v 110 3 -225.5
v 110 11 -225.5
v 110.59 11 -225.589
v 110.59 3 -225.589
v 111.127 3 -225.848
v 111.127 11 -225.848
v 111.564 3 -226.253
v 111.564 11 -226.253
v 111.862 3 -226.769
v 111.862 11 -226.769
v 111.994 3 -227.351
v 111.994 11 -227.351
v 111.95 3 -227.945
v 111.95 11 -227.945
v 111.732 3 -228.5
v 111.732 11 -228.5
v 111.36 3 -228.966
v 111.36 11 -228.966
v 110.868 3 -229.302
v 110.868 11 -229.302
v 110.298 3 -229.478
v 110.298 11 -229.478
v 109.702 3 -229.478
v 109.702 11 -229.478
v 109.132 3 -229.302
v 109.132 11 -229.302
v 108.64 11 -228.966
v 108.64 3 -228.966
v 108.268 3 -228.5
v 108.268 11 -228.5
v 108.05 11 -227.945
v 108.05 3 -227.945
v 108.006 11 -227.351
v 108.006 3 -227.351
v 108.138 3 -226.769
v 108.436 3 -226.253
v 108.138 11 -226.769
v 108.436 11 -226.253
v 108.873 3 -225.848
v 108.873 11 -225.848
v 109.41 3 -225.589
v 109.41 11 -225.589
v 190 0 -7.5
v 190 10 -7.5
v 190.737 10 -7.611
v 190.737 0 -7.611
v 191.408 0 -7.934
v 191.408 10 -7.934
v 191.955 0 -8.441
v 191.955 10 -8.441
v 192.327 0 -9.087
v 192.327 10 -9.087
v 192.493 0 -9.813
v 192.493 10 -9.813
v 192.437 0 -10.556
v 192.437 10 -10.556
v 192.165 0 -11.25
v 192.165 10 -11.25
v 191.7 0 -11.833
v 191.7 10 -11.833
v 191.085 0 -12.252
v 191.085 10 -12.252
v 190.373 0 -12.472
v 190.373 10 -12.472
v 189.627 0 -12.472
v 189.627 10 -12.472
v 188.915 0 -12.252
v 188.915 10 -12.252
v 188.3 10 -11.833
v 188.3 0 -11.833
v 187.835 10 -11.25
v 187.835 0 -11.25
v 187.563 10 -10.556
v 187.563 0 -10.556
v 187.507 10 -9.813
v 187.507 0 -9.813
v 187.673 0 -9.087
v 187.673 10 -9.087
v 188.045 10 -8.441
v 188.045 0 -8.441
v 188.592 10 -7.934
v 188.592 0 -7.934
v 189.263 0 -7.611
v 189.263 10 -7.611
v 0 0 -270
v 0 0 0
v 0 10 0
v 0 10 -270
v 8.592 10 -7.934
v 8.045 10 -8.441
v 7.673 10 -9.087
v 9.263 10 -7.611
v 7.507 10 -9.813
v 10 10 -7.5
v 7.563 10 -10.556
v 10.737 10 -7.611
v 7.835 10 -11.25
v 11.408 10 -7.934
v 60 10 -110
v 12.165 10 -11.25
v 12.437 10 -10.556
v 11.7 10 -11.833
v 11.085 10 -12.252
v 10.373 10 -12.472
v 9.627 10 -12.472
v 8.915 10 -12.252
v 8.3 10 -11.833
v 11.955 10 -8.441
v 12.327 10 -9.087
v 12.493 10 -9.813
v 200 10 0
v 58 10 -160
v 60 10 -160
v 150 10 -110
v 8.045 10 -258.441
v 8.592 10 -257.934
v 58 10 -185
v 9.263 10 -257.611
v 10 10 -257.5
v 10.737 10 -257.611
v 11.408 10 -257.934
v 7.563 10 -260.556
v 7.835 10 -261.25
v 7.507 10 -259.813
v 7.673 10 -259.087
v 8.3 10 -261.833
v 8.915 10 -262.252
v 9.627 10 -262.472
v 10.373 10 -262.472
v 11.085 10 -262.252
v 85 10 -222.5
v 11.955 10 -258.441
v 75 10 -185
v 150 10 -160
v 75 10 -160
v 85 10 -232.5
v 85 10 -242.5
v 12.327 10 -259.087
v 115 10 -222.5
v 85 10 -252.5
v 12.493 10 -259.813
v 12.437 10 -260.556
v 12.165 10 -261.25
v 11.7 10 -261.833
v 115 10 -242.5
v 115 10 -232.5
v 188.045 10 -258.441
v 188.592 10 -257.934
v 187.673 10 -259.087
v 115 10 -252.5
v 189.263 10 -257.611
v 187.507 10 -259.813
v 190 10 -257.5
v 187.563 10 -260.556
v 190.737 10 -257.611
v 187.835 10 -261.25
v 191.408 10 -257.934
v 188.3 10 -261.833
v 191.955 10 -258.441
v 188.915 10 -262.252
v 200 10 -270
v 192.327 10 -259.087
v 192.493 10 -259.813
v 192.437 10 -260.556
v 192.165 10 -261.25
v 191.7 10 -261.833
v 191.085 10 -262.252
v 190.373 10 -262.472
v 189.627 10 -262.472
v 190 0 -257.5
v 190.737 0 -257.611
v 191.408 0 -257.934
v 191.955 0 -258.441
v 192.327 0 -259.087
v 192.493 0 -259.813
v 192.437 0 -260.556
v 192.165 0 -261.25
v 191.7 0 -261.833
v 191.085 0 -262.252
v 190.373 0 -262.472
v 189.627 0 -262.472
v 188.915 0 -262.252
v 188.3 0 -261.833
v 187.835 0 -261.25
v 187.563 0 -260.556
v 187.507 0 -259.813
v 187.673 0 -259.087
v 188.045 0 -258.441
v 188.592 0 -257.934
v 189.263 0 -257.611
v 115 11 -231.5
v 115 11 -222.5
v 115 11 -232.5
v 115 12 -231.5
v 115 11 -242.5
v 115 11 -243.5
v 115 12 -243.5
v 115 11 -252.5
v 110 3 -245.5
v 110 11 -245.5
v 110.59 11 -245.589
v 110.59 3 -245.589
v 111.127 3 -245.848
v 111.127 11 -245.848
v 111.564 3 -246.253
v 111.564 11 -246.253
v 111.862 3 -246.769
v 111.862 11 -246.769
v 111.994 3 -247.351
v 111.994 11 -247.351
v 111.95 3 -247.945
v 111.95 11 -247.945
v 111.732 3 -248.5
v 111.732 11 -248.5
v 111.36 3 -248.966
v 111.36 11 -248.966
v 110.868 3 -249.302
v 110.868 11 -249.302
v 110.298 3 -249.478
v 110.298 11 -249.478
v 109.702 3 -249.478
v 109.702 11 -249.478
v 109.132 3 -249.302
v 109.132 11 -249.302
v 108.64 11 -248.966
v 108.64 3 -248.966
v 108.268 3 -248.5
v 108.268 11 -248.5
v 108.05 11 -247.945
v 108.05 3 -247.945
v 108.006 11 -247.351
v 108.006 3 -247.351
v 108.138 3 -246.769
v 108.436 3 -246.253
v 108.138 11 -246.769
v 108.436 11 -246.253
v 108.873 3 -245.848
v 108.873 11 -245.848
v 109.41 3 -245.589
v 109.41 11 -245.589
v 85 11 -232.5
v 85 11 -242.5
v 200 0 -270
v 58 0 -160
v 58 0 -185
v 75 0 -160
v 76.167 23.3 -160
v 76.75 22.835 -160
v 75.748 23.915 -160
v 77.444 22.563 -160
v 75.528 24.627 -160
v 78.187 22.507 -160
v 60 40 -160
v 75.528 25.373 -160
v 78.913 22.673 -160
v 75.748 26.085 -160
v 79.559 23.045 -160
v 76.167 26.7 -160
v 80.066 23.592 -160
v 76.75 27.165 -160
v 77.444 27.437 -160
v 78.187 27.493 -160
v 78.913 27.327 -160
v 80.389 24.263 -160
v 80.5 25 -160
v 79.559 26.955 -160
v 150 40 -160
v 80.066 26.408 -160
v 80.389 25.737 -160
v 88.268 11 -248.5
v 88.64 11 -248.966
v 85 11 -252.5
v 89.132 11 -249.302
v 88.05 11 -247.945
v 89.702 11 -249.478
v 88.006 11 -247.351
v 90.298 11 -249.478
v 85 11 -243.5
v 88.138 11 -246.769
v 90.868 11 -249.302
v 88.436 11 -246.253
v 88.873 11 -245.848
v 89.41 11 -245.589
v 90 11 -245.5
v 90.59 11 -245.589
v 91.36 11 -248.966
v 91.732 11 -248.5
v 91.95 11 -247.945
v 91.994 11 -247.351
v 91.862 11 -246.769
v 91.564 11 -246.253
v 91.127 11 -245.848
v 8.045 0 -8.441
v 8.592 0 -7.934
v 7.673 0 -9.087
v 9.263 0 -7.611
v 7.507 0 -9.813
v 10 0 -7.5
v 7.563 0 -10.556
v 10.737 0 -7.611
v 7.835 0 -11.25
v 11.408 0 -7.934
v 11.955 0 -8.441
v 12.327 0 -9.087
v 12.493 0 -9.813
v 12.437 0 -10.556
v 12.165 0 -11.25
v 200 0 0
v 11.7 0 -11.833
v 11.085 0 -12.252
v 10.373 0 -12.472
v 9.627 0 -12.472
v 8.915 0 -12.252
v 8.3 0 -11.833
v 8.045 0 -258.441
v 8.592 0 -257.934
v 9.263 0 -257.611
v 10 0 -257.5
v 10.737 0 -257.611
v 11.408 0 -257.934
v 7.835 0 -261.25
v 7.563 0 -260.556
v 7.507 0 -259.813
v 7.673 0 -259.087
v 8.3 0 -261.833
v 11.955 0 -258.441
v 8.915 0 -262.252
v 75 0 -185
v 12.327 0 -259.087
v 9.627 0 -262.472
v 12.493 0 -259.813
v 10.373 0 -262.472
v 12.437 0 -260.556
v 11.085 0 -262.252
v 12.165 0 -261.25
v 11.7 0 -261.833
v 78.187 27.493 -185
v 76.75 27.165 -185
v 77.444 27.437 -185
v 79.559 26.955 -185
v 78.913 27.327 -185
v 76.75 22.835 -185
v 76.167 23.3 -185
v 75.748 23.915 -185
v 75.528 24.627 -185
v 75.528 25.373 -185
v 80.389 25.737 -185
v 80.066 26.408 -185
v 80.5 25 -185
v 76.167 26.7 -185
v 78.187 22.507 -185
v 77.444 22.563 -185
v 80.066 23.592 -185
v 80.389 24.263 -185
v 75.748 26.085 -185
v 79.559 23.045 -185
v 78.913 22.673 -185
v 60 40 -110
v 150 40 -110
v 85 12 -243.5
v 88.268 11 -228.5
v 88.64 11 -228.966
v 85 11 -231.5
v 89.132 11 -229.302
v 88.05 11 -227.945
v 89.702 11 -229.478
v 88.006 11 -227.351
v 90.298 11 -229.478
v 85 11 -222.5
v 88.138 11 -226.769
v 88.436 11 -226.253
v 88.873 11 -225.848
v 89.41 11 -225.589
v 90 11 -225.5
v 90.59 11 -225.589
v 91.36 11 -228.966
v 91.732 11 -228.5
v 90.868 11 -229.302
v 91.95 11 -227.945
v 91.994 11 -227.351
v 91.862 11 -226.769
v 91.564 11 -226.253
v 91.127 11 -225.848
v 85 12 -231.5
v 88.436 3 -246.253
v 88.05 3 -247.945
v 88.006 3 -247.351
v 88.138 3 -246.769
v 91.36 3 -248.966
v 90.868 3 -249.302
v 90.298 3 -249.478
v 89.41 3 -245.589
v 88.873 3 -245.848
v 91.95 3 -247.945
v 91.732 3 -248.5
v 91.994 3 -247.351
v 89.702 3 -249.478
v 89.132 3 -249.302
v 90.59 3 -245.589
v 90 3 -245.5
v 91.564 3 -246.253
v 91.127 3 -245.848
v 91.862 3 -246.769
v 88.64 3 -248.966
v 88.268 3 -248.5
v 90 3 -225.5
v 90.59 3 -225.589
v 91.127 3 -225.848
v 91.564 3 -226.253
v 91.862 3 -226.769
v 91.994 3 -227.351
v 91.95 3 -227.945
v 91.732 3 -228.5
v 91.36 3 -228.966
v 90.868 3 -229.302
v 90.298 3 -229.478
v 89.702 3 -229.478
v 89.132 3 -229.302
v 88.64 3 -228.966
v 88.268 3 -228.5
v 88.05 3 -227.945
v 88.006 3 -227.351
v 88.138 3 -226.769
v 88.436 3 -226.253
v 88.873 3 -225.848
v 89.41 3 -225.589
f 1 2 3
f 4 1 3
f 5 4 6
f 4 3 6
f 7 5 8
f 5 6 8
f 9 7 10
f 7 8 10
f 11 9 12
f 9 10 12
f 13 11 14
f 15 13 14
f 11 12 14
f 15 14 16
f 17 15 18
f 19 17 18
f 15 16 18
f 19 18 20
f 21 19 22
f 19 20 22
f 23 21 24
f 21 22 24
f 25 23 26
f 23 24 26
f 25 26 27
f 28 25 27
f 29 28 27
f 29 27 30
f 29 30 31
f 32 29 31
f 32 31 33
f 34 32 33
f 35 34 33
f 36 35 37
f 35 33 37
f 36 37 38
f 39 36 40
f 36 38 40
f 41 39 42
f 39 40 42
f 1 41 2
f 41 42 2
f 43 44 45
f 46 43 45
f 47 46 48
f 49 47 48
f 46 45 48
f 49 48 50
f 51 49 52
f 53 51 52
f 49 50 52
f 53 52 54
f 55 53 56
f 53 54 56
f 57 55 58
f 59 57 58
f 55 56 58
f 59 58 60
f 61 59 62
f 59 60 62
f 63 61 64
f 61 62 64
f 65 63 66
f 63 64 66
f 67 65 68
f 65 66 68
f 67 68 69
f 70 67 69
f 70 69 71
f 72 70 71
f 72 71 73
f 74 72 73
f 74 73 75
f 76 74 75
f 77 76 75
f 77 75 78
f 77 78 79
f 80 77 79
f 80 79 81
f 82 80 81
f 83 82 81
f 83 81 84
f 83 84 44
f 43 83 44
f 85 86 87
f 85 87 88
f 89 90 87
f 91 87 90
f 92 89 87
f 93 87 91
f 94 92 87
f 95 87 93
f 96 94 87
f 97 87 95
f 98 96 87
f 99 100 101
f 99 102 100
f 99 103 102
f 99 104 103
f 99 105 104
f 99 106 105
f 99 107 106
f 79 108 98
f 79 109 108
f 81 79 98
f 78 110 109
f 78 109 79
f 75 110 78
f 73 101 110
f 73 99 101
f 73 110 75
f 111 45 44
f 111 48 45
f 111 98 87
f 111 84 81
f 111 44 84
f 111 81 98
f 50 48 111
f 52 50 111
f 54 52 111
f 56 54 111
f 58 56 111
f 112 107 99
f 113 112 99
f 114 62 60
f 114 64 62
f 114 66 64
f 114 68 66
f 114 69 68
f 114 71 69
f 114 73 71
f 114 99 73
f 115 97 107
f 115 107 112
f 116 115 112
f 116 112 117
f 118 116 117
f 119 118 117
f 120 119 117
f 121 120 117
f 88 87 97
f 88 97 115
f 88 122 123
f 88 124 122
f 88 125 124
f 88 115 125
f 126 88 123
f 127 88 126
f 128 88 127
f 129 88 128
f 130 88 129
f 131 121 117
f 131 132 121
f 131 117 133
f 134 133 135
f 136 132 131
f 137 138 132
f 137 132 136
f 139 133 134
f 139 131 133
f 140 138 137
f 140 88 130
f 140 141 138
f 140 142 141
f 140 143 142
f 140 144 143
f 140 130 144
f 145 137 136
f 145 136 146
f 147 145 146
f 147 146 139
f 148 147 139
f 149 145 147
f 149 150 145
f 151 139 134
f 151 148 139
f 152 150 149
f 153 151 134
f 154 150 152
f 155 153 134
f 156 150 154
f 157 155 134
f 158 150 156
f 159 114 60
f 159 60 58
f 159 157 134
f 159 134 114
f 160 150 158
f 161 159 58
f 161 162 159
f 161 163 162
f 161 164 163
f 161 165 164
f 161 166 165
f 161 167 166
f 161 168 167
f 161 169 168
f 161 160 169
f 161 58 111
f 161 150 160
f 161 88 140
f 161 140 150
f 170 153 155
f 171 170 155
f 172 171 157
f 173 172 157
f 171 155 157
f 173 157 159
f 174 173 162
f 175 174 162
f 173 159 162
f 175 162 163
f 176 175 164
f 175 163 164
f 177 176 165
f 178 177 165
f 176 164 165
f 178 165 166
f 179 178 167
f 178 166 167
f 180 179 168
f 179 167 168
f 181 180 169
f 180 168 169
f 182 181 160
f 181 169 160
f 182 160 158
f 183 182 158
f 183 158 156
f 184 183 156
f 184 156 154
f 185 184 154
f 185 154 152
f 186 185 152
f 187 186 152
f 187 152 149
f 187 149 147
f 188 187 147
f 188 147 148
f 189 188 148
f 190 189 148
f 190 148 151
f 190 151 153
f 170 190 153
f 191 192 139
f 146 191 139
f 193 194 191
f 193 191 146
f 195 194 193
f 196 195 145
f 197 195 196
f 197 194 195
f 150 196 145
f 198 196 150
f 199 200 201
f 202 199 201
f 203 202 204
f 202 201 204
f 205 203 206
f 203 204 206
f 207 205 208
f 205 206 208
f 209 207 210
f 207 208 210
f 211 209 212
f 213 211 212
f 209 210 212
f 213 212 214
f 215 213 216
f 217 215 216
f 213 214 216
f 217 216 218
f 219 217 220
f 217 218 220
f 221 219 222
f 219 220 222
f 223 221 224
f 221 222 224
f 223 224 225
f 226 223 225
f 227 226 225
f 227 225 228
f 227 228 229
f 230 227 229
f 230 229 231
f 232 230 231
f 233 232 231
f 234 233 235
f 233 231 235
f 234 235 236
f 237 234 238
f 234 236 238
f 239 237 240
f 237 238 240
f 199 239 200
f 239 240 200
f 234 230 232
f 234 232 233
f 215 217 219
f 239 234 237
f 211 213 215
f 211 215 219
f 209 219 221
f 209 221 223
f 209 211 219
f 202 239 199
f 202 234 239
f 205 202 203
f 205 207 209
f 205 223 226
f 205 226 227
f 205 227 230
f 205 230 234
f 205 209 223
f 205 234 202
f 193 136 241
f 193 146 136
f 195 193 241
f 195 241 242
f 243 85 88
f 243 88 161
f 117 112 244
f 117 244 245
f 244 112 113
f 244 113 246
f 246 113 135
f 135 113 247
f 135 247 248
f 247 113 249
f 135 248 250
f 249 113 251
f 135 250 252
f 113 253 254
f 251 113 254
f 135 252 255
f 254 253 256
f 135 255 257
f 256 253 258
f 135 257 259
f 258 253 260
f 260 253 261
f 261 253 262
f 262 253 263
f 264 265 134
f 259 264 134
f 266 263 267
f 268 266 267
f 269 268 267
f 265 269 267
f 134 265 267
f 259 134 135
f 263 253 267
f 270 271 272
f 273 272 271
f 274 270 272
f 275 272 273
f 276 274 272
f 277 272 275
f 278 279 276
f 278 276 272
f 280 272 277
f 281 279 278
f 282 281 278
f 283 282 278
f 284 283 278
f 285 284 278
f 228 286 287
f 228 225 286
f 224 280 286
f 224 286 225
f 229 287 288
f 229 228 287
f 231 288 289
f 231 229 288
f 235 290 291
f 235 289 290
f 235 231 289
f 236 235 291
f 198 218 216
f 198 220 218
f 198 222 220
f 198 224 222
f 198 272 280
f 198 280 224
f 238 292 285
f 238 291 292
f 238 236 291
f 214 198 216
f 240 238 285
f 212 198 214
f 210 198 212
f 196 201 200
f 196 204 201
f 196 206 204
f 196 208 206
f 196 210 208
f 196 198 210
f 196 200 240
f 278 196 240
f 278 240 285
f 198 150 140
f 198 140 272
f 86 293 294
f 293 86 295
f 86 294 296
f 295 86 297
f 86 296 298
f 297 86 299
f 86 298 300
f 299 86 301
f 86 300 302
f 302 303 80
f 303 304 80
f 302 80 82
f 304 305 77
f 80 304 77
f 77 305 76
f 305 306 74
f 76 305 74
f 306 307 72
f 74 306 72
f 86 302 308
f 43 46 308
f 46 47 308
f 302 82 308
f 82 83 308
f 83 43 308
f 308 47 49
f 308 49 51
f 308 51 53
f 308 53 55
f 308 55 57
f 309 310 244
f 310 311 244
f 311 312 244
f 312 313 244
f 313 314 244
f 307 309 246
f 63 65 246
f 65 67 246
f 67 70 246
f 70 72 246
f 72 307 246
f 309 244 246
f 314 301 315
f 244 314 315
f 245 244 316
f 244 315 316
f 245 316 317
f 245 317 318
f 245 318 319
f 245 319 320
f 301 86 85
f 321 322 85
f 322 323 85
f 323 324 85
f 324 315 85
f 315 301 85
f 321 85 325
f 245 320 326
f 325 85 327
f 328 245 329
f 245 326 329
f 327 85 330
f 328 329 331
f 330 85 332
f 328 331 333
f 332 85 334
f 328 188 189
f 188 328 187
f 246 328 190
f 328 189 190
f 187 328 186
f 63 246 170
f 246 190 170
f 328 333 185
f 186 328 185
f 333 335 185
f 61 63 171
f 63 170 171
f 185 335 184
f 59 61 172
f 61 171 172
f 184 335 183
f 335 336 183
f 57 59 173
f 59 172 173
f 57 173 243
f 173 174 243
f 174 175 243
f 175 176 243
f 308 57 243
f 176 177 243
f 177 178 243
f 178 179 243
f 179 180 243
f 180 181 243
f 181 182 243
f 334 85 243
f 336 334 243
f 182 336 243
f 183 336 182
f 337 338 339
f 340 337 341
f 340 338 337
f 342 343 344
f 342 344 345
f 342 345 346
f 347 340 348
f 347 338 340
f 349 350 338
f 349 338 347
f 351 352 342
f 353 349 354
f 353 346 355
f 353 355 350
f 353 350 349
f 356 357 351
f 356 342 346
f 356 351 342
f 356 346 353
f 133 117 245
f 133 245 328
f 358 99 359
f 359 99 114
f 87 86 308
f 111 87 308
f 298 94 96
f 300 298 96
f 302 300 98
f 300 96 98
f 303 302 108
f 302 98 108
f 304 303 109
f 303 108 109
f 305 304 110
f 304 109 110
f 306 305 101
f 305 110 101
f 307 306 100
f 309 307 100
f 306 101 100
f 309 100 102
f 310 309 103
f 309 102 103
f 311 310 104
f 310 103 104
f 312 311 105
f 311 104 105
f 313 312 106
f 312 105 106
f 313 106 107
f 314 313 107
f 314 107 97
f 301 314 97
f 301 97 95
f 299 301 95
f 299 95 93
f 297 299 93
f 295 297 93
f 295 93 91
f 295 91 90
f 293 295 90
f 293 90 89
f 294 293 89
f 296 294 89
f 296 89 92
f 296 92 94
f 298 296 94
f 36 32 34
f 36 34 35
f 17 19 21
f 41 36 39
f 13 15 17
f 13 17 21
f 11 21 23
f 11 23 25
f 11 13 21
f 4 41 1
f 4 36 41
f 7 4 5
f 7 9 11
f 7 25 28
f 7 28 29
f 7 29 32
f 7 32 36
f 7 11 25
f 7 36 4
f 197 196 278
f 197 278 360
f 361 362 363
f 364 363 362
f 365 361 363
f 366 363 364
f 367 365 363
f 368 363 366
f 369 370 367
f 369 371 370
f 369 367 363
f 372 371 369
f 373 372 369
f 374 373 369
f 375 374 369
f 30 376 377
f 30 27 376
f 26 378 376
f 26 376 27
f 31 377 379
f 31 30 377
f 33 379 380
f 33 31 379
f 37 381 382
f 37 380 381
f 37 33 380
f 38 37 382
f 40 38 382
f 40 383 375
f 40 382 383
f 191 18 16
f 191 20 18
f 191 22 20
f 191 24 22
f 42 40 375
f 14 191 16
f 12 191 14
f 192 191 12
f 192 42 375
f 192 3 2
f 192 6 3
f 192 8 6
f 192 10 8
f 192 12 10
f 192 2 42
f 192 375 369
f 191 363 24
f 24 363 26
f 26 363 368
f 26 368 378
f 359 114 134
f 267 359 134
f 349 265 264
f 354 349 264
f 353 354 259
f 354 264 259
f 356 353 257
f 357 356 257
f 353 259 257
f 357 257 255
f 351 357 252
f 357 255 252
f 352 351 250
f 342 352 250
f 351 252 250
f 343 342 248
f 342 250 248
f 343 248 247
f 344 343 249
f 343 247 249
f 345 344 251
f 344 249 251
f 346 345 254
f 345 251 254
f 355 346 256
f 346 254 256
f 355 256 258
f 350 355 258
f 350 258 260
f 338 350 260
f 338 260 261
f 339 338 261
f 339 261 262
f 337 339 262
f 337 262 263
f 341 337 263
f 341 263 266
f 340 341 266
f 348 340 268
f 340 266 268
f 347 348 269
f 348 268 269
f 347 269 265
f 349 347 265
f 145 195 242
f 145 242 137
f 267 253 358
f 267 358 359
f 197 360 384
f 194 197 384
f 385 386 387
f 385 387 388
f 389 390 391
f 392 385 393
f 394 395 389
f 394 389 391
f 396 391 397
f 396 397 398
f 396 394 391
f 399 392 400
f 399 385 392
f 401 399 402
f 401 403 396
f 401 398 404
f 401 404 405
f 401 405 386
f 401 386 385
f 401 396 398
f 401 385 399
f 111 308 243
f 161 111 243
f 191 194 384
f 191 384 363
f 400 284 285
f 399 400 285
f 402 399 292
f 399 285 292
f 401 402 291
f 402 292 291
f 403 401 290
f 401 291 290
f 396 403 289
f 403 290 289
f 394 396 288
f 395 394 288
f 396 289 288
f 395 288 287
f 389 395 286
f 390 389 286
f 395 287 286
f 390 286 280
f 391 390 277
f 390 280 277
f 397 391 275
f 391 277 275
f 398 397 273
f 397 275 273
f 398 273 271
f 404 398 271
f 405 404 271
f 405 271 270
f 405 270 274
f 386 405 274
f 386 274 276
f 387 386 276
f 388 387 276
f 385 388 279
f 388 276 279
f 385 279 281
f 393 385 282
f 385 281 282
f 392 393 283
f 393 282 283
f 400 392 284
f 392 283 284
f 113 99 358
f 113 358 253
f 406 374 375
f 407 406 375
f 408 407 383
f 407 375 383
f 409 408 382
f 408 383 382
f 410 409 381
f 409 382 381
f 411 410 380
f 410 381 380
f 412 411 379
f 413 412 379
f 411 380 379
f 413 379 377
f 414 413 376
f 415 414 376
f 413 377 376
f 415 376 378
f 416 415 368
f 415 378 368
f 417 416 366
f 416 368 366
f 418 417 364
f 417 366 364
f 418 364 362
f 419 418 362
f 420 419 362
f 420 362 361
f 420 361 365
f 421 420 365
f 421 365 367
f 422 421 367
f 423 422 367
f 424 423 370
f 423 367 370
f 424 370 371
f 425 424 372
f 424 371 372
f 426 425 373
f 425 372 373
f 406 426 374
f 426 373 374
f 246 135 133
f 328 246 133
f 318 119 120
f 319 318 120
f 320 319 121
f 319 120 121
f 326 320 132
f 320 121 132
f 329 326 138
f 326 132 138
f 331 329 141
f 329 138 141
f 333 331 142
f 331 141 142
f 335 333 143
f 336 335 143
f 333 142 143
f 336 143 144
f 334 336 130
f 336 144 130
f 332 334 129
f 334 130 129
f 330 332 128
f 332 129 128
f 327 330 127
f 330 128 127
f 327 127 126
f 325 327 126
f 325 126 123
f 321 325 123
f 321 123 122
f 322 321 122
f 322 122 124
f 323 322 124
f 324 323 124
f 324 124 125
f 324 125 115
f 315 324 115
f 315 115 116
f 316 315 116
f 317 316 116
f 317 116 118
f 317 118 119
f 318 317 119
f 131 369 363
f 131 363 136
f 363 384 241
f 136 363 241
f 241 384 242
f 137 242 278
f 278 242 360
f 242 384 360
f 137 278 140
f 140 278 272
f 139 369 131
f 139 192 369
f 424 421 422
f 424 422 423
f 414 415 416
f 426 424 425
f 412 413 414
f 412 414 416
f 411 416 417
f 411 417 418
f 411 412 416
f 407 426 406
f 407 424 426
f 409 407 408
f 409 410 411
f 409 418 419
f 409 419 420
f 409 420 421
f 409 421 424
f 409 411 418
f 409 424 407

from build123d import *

# Parameters (mm, degrees)
SKETCH_1_W          = 200
SKETCH_1_H          = 270
EXTRUDE_1_DEPTH     = 10
SKETCH_3_R          = 2.5
CUT_EXTRUDE_1_DEPTH = 20
SKETCH_6_W          = 90
SKETCH_6_H          = 50
EXTRUDE_2_DEPTH     = 30
CUT_EXTRUDE_3_REACH = 339.343
SKETCH_9_W          = 17
SKETCH_9_H          = 25
EXTRUDE_4_DEPTH     = 15
SKETCH_11_R         = 2
CUT_EXTRUDE_4_DEPTH = 8
SKETCH_12_R         = 2.5
EXTRUDE_5_DEPTH     = 25


with BuildPart() as part:
    # 草图1 → 凸台-拉伸1 (new body)
    with BuildSketch(Plane(origin=(0, 0, 0), x_dir=(1, 0, 0), z_dir=(0, 1, 0))):
        with Locations((100, 135)):
            Rectangle(SKETCH_1_W, SKETCH_1_H)
    extrude(amount=EXTRUDE_1_DEPTH)

    # 草图3 → 切除-拉伸1 (cut)
    with BuildSketch(Plane(origin=(0, 10, 0), x_dir=(1, 0, 0), z_dir=(0, 1, 0))):
        with Locations(Location((10, 260, 0), (0, 0, 270))):
            Circle(SKETCH_3_R)
        with Locations(Location((10, 10, 0), (0, 0, 270))):
            Circle(SKETCH_3_R)
        with Locations(Location((190, 10, 0), (0, 0, 270))):
            Circle(SKETCH_3_R)
        with Locations(Location((190, 260, 0), (0, 0, 270))):
            Circle(SKETCH_3_R)
    extrude(amount=-CUT_EXTRUDE_1_DEPTH, mode=Mode.SUBTRACT)

    # 草图6 → 凸台-拉伸2 (add)
    with BuildSketch(Plane(origin=(0, 10, 0), x_dir=(1, 0, 0), z_dir=(0, 1, 0))):
        with Locations((105, 135)):
            Rectangle(SKETCH_6_W, SKETCH_6_H)
    extrude(amount=EXTRUDE_2_DEPTH)

    # 草图9 → 切除-拉伸3 (cut, up to next)
    with BuildSketch(Plane(origin=(0, 10, 0), x_dir=(1, 0, 0), z_dir=(0, 1, 0)), mode=Mode.PRIVATE) as cut_extrude_3_sk1:
        with Locations((66.5, 172.5)):
            Rectangle(SKETCH_9_W, SKETCH_9_H)
    cut_extrude_3_tool1 = extrude(cut_extrude_3_sk1.sketch, amount=-CUT_EXTRUDE_3_REACH, mode=Mode.PRIVATE) & part.part
    add(cut_extrude_3_tool1.solids().sort_by_distance((66.5, 10, -172.5))[0], mode=Mode.SUBTRACT)

    # 草图5 → 凸台-拉伸4 (add, symmetric)
    with BuildSketch(Plane(origin=(100, 0, 0), x_dir=(0, 0, -1), z_dir=(1, 0, 0))):
        Polygon((232.5, 10), (232.5, 11), (242.5, 11), (242.5, 10), (252.5, 10), (252.5, 11), (243.5, 11), (243.5, 12), (231.5, 12), (231.5, 11), (222.5, 11), (222.5, 10), align=None)
    extrude(amount=EXTRUDE_4_DEPTH, both=True)

    # 草图11 → 切除-拉伸4 (cut)
    with BuildSketch(Plane(origin=(0, 11, 0), x_dir=(1, 0, 0), z_dir=(0, 1, 0))):
        with Locations(Location((90, 227.5, 0), (0, 0, 270))):
            Circle(SKETCH_11_R)
        with Locations(Location((110, 227.5, 0), (0, 0, 270))):
            Circle(SKETCH_11_R)
        with Locations(Location((90, 247.5, 0), (0, 0, 270))):
            Circle(SKETCH_11_R)
        with Locations(Location((110, 247.5, 0), (0, 0, 270))):
            Circle(SKETCH_11_R)
    extrude(amount=-CUT_EXTRUDE_4_DEPTH, mode=Mode.SUBTRACT)

    # 草图12 → 凸台-拉伸5 (add)
    with BuildSketch(Plane(origin=(0, 0, -160), x_dir=(-1, 0, 0), z_dir=(0, 0, -1))):
        with Locations(Location((-78, 25, 0), (0, 0, 180))):
            Circle(SKETCH_12_R)
    extrude(amount=EXTRUDE_5_DEPTH)


solid = part.part
